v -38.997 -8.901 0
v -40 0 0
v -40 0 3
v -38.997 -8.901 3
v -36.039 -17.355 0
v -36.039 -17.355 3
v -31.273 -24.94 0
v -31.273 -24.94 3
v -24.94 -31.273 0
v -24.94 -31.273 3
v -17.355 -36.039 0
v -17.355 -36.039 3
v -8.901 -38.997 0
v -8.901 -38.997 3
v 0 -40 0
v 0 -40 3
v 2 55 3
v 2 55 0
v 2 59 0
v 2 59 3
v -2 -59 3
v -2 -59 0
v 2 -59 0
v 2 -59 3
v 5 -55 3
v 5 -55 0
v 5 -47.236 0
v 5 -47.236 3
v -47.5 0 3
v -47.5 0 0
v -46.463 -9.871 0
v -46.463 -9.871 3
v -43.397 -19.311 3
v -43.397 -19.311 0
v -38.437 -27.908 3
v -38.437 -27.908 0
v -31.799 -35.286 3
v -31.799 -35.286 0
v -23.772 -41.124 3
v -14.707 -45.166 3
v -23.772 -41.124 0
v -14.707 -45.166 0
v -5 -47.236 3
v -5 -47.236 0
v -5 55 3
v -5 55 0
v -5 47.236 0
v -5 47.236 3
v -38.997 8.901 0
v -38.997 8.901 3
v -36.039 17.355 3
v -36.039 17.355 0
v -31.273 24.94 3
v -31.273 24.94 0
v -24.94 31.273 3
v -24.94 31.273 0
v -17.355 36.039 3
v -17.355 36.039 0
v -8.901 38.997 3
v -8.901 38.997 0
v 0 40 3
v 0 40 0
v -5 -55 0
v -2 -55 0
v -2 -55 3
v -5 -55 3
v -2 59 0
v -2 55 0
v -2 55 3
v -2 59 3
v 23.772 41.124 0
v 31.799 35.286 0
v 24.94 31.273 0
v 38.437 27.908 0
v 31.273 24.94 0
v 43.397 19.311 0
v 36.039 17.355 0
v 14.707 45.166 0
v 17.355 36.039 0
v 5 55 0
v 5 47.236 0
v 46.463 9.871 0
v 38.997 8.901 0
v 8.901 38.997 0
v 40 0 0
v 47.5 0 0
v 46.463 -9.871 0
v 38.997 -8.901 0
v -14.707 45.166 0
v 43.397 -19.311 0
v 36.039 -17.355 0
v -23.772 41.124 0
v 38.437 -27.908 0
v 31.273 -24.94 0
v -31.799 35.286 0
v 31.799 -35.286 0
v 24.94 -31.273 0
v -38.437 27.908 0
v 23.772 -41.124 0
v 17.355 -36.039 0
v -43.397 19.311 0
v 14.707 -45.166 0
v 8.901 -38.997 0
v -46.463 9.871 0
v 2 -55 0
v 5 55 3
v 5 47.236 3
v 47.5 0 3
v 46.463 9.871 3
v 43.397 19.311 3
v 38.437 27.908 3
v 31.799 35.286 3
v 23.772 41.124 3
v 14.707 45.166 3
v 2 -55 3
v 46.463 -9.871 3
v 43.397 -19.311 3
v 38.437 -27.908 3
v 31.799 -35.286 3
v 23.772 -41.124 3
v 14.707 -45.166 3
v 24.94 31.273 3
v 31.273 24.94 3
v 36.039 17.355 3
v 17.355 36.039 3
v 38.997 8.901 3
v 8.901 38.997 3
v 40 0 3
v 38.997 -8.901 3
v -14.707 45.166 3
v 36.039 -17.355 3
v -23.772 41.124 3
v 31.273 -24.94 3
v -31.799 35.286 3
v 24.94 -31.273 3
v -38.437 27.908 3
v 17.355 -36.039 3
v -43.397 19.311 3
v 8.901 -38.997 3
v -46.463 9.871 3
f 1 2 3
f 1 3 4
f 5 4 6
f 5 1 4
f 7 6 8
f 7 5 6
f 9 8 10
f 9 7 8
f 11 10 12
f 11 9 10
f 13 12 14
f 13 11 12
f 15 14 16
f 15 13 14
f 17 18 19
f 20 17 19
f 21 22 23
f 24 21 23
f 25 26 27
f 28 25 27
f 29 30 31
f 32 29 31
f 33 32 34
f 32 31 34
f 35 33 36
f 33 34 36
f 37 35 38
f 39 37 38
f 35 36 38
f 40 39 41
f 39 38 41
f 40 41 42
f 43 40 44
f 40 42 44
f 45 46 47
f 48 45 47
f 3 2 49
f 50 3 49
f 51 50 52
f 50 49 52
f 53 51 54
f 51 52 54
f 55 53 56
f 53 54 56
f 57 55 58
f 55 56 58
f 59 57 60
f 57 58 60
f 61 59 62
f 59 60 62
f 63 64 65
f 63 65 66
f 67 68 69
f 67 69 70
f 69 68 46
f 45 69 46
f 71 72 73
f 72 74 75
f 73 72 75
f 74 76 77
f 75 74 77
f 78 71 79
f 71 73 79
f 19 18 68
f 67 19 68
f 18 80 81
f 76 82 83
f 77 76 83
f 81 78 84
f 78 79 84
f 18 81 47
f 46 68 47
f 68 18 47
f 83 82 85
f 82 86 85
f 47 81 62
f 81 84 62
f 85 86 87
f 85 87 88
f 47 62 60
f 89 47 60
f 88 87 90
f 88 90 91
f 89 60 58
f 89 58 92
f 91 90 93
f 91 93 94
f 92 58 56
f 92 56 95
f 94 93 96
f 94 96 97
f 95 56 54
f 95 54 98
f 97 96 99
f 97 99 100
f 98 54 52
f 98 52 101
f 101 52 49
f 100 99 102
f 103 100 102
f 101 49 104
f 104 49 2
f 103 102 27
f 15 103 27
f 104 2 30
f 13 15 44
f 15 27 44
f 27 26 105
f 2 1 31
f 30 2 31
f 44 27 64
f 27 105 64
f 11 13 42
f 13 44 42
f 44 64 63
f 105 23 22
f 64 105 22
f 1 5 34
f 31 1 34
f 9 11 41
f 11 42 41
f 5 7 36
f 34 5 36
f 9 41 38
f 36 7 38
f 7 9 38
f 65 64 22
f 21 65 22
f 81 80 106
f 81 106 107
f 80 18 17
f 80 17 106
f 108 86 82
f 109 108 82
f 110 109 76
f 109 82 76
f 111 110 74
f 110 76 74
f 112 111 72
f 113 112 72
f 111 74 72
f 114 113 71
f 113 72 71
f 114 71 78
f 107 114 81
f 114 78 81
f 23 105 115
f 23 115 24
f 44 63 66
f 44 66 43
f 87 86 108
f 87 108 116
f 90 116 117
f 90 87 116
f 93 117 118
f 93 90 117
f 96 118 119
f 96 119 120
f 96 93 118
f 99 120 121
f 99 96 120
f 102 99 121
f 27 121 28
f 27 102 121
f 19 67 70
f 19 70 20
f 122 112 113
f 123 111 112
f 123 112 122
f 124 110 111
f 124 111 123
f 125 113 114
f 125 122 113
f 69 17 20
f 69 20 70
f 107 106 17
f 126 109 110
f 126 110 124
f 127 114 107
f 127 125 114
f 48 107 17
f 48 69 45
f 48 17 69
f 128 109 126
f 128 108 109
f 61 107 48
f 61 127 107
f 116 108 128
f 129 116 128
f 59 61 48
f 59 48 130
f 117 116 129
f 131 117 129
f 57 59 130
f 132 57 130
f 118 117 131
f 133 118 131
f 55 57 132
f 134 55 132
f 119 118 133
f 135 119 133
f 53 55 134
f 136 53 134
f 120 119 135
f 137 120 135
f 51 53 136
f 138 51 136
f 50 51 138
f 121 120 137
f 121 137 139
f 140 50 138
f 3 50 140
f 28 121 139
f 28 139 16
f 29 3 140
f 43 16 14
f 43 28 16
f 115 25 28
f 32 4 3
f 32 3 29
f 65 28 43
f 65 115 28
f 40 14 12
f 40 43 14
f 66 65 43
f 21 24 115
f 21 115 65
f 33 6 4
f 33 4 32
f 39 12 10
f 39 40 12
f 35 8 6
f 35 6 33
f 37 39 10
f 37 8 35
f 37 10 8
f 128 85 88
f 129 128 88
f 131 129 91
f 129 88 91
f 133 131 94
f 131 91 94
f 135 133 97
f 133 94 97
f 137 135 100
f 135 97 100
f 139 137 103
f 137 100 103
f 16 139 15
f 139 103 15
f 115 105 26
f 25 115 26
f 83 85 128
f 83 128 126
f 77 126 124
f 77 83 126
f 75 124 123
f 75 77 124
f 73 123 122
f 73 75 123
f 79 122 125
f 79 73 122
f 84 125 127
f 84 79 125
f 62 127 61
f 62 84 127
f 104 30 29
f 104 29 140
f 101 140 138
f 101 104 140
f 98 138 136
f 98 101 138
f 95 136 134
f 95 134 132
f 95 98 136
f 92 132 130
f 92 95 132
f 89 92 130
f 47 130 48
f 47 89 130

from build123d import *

# Parameters (mm, degrees)
PAD_DEPTH            = 3
PAD_MIRRORED_2_DEPTH = 3


with BuildPart() as part:
    # Sketch → Pad (new body)
    with BuildSketch(Plane.XY):
        with BuildLine():
            ThreePointArc((47.5, 0), (35.311117, 31.770663), (5, 47.236109))
            Line((5, 55), (5, 47.236109))
            Line((2, 55), (5, 55))
            Line((2, 55), (2, 59))
            Line((2, 59), (0, 59))
            Line((0, 40), (0, 59))
            ThreePointArc((40, 0), (28.284271, 28.284271), (0, 40))
            Line((40, 0), (47.5, 0))
        make_face()
    pad = extrude(amount=PAD_DEPTH)

    # Sketch Mirrored 2 → Pad Mirrored 2 (add)
    with BuildSketch(Plane(origin=(0, 0, 0), x_dir=(-1, 0, 0), z_dir=(0, 0, -1))):
        with BuildLine():
            ThreePointArc((47.5, 0), (35.311117, 31.770663), (5, 47.236109))
            Line((5, 55), (5, 47.236109))
            Line((2, 55), (5, 55))
            Line((2, 55), (2, 59))
            Line((2, 59), (0, 59))
            Line((0, 40), (0, 59))
            ThreePointArc((40, 0), (28.284271, 28.284271), (0, 40))
            Line((40, 0), (47.5, 0))
        make_face()
    pad_mirrored_2 = extrude(amount=-PAD_MIRRORED_2_DEPTH)

    # Mirrored001: Pad, Pad Mirrored 2 across Sketch H_Axis
    add(pad.mirror(Plane.ZX))
    add(pad_mirrored_2.mirror(Plane.ZX))


solid = part.part
